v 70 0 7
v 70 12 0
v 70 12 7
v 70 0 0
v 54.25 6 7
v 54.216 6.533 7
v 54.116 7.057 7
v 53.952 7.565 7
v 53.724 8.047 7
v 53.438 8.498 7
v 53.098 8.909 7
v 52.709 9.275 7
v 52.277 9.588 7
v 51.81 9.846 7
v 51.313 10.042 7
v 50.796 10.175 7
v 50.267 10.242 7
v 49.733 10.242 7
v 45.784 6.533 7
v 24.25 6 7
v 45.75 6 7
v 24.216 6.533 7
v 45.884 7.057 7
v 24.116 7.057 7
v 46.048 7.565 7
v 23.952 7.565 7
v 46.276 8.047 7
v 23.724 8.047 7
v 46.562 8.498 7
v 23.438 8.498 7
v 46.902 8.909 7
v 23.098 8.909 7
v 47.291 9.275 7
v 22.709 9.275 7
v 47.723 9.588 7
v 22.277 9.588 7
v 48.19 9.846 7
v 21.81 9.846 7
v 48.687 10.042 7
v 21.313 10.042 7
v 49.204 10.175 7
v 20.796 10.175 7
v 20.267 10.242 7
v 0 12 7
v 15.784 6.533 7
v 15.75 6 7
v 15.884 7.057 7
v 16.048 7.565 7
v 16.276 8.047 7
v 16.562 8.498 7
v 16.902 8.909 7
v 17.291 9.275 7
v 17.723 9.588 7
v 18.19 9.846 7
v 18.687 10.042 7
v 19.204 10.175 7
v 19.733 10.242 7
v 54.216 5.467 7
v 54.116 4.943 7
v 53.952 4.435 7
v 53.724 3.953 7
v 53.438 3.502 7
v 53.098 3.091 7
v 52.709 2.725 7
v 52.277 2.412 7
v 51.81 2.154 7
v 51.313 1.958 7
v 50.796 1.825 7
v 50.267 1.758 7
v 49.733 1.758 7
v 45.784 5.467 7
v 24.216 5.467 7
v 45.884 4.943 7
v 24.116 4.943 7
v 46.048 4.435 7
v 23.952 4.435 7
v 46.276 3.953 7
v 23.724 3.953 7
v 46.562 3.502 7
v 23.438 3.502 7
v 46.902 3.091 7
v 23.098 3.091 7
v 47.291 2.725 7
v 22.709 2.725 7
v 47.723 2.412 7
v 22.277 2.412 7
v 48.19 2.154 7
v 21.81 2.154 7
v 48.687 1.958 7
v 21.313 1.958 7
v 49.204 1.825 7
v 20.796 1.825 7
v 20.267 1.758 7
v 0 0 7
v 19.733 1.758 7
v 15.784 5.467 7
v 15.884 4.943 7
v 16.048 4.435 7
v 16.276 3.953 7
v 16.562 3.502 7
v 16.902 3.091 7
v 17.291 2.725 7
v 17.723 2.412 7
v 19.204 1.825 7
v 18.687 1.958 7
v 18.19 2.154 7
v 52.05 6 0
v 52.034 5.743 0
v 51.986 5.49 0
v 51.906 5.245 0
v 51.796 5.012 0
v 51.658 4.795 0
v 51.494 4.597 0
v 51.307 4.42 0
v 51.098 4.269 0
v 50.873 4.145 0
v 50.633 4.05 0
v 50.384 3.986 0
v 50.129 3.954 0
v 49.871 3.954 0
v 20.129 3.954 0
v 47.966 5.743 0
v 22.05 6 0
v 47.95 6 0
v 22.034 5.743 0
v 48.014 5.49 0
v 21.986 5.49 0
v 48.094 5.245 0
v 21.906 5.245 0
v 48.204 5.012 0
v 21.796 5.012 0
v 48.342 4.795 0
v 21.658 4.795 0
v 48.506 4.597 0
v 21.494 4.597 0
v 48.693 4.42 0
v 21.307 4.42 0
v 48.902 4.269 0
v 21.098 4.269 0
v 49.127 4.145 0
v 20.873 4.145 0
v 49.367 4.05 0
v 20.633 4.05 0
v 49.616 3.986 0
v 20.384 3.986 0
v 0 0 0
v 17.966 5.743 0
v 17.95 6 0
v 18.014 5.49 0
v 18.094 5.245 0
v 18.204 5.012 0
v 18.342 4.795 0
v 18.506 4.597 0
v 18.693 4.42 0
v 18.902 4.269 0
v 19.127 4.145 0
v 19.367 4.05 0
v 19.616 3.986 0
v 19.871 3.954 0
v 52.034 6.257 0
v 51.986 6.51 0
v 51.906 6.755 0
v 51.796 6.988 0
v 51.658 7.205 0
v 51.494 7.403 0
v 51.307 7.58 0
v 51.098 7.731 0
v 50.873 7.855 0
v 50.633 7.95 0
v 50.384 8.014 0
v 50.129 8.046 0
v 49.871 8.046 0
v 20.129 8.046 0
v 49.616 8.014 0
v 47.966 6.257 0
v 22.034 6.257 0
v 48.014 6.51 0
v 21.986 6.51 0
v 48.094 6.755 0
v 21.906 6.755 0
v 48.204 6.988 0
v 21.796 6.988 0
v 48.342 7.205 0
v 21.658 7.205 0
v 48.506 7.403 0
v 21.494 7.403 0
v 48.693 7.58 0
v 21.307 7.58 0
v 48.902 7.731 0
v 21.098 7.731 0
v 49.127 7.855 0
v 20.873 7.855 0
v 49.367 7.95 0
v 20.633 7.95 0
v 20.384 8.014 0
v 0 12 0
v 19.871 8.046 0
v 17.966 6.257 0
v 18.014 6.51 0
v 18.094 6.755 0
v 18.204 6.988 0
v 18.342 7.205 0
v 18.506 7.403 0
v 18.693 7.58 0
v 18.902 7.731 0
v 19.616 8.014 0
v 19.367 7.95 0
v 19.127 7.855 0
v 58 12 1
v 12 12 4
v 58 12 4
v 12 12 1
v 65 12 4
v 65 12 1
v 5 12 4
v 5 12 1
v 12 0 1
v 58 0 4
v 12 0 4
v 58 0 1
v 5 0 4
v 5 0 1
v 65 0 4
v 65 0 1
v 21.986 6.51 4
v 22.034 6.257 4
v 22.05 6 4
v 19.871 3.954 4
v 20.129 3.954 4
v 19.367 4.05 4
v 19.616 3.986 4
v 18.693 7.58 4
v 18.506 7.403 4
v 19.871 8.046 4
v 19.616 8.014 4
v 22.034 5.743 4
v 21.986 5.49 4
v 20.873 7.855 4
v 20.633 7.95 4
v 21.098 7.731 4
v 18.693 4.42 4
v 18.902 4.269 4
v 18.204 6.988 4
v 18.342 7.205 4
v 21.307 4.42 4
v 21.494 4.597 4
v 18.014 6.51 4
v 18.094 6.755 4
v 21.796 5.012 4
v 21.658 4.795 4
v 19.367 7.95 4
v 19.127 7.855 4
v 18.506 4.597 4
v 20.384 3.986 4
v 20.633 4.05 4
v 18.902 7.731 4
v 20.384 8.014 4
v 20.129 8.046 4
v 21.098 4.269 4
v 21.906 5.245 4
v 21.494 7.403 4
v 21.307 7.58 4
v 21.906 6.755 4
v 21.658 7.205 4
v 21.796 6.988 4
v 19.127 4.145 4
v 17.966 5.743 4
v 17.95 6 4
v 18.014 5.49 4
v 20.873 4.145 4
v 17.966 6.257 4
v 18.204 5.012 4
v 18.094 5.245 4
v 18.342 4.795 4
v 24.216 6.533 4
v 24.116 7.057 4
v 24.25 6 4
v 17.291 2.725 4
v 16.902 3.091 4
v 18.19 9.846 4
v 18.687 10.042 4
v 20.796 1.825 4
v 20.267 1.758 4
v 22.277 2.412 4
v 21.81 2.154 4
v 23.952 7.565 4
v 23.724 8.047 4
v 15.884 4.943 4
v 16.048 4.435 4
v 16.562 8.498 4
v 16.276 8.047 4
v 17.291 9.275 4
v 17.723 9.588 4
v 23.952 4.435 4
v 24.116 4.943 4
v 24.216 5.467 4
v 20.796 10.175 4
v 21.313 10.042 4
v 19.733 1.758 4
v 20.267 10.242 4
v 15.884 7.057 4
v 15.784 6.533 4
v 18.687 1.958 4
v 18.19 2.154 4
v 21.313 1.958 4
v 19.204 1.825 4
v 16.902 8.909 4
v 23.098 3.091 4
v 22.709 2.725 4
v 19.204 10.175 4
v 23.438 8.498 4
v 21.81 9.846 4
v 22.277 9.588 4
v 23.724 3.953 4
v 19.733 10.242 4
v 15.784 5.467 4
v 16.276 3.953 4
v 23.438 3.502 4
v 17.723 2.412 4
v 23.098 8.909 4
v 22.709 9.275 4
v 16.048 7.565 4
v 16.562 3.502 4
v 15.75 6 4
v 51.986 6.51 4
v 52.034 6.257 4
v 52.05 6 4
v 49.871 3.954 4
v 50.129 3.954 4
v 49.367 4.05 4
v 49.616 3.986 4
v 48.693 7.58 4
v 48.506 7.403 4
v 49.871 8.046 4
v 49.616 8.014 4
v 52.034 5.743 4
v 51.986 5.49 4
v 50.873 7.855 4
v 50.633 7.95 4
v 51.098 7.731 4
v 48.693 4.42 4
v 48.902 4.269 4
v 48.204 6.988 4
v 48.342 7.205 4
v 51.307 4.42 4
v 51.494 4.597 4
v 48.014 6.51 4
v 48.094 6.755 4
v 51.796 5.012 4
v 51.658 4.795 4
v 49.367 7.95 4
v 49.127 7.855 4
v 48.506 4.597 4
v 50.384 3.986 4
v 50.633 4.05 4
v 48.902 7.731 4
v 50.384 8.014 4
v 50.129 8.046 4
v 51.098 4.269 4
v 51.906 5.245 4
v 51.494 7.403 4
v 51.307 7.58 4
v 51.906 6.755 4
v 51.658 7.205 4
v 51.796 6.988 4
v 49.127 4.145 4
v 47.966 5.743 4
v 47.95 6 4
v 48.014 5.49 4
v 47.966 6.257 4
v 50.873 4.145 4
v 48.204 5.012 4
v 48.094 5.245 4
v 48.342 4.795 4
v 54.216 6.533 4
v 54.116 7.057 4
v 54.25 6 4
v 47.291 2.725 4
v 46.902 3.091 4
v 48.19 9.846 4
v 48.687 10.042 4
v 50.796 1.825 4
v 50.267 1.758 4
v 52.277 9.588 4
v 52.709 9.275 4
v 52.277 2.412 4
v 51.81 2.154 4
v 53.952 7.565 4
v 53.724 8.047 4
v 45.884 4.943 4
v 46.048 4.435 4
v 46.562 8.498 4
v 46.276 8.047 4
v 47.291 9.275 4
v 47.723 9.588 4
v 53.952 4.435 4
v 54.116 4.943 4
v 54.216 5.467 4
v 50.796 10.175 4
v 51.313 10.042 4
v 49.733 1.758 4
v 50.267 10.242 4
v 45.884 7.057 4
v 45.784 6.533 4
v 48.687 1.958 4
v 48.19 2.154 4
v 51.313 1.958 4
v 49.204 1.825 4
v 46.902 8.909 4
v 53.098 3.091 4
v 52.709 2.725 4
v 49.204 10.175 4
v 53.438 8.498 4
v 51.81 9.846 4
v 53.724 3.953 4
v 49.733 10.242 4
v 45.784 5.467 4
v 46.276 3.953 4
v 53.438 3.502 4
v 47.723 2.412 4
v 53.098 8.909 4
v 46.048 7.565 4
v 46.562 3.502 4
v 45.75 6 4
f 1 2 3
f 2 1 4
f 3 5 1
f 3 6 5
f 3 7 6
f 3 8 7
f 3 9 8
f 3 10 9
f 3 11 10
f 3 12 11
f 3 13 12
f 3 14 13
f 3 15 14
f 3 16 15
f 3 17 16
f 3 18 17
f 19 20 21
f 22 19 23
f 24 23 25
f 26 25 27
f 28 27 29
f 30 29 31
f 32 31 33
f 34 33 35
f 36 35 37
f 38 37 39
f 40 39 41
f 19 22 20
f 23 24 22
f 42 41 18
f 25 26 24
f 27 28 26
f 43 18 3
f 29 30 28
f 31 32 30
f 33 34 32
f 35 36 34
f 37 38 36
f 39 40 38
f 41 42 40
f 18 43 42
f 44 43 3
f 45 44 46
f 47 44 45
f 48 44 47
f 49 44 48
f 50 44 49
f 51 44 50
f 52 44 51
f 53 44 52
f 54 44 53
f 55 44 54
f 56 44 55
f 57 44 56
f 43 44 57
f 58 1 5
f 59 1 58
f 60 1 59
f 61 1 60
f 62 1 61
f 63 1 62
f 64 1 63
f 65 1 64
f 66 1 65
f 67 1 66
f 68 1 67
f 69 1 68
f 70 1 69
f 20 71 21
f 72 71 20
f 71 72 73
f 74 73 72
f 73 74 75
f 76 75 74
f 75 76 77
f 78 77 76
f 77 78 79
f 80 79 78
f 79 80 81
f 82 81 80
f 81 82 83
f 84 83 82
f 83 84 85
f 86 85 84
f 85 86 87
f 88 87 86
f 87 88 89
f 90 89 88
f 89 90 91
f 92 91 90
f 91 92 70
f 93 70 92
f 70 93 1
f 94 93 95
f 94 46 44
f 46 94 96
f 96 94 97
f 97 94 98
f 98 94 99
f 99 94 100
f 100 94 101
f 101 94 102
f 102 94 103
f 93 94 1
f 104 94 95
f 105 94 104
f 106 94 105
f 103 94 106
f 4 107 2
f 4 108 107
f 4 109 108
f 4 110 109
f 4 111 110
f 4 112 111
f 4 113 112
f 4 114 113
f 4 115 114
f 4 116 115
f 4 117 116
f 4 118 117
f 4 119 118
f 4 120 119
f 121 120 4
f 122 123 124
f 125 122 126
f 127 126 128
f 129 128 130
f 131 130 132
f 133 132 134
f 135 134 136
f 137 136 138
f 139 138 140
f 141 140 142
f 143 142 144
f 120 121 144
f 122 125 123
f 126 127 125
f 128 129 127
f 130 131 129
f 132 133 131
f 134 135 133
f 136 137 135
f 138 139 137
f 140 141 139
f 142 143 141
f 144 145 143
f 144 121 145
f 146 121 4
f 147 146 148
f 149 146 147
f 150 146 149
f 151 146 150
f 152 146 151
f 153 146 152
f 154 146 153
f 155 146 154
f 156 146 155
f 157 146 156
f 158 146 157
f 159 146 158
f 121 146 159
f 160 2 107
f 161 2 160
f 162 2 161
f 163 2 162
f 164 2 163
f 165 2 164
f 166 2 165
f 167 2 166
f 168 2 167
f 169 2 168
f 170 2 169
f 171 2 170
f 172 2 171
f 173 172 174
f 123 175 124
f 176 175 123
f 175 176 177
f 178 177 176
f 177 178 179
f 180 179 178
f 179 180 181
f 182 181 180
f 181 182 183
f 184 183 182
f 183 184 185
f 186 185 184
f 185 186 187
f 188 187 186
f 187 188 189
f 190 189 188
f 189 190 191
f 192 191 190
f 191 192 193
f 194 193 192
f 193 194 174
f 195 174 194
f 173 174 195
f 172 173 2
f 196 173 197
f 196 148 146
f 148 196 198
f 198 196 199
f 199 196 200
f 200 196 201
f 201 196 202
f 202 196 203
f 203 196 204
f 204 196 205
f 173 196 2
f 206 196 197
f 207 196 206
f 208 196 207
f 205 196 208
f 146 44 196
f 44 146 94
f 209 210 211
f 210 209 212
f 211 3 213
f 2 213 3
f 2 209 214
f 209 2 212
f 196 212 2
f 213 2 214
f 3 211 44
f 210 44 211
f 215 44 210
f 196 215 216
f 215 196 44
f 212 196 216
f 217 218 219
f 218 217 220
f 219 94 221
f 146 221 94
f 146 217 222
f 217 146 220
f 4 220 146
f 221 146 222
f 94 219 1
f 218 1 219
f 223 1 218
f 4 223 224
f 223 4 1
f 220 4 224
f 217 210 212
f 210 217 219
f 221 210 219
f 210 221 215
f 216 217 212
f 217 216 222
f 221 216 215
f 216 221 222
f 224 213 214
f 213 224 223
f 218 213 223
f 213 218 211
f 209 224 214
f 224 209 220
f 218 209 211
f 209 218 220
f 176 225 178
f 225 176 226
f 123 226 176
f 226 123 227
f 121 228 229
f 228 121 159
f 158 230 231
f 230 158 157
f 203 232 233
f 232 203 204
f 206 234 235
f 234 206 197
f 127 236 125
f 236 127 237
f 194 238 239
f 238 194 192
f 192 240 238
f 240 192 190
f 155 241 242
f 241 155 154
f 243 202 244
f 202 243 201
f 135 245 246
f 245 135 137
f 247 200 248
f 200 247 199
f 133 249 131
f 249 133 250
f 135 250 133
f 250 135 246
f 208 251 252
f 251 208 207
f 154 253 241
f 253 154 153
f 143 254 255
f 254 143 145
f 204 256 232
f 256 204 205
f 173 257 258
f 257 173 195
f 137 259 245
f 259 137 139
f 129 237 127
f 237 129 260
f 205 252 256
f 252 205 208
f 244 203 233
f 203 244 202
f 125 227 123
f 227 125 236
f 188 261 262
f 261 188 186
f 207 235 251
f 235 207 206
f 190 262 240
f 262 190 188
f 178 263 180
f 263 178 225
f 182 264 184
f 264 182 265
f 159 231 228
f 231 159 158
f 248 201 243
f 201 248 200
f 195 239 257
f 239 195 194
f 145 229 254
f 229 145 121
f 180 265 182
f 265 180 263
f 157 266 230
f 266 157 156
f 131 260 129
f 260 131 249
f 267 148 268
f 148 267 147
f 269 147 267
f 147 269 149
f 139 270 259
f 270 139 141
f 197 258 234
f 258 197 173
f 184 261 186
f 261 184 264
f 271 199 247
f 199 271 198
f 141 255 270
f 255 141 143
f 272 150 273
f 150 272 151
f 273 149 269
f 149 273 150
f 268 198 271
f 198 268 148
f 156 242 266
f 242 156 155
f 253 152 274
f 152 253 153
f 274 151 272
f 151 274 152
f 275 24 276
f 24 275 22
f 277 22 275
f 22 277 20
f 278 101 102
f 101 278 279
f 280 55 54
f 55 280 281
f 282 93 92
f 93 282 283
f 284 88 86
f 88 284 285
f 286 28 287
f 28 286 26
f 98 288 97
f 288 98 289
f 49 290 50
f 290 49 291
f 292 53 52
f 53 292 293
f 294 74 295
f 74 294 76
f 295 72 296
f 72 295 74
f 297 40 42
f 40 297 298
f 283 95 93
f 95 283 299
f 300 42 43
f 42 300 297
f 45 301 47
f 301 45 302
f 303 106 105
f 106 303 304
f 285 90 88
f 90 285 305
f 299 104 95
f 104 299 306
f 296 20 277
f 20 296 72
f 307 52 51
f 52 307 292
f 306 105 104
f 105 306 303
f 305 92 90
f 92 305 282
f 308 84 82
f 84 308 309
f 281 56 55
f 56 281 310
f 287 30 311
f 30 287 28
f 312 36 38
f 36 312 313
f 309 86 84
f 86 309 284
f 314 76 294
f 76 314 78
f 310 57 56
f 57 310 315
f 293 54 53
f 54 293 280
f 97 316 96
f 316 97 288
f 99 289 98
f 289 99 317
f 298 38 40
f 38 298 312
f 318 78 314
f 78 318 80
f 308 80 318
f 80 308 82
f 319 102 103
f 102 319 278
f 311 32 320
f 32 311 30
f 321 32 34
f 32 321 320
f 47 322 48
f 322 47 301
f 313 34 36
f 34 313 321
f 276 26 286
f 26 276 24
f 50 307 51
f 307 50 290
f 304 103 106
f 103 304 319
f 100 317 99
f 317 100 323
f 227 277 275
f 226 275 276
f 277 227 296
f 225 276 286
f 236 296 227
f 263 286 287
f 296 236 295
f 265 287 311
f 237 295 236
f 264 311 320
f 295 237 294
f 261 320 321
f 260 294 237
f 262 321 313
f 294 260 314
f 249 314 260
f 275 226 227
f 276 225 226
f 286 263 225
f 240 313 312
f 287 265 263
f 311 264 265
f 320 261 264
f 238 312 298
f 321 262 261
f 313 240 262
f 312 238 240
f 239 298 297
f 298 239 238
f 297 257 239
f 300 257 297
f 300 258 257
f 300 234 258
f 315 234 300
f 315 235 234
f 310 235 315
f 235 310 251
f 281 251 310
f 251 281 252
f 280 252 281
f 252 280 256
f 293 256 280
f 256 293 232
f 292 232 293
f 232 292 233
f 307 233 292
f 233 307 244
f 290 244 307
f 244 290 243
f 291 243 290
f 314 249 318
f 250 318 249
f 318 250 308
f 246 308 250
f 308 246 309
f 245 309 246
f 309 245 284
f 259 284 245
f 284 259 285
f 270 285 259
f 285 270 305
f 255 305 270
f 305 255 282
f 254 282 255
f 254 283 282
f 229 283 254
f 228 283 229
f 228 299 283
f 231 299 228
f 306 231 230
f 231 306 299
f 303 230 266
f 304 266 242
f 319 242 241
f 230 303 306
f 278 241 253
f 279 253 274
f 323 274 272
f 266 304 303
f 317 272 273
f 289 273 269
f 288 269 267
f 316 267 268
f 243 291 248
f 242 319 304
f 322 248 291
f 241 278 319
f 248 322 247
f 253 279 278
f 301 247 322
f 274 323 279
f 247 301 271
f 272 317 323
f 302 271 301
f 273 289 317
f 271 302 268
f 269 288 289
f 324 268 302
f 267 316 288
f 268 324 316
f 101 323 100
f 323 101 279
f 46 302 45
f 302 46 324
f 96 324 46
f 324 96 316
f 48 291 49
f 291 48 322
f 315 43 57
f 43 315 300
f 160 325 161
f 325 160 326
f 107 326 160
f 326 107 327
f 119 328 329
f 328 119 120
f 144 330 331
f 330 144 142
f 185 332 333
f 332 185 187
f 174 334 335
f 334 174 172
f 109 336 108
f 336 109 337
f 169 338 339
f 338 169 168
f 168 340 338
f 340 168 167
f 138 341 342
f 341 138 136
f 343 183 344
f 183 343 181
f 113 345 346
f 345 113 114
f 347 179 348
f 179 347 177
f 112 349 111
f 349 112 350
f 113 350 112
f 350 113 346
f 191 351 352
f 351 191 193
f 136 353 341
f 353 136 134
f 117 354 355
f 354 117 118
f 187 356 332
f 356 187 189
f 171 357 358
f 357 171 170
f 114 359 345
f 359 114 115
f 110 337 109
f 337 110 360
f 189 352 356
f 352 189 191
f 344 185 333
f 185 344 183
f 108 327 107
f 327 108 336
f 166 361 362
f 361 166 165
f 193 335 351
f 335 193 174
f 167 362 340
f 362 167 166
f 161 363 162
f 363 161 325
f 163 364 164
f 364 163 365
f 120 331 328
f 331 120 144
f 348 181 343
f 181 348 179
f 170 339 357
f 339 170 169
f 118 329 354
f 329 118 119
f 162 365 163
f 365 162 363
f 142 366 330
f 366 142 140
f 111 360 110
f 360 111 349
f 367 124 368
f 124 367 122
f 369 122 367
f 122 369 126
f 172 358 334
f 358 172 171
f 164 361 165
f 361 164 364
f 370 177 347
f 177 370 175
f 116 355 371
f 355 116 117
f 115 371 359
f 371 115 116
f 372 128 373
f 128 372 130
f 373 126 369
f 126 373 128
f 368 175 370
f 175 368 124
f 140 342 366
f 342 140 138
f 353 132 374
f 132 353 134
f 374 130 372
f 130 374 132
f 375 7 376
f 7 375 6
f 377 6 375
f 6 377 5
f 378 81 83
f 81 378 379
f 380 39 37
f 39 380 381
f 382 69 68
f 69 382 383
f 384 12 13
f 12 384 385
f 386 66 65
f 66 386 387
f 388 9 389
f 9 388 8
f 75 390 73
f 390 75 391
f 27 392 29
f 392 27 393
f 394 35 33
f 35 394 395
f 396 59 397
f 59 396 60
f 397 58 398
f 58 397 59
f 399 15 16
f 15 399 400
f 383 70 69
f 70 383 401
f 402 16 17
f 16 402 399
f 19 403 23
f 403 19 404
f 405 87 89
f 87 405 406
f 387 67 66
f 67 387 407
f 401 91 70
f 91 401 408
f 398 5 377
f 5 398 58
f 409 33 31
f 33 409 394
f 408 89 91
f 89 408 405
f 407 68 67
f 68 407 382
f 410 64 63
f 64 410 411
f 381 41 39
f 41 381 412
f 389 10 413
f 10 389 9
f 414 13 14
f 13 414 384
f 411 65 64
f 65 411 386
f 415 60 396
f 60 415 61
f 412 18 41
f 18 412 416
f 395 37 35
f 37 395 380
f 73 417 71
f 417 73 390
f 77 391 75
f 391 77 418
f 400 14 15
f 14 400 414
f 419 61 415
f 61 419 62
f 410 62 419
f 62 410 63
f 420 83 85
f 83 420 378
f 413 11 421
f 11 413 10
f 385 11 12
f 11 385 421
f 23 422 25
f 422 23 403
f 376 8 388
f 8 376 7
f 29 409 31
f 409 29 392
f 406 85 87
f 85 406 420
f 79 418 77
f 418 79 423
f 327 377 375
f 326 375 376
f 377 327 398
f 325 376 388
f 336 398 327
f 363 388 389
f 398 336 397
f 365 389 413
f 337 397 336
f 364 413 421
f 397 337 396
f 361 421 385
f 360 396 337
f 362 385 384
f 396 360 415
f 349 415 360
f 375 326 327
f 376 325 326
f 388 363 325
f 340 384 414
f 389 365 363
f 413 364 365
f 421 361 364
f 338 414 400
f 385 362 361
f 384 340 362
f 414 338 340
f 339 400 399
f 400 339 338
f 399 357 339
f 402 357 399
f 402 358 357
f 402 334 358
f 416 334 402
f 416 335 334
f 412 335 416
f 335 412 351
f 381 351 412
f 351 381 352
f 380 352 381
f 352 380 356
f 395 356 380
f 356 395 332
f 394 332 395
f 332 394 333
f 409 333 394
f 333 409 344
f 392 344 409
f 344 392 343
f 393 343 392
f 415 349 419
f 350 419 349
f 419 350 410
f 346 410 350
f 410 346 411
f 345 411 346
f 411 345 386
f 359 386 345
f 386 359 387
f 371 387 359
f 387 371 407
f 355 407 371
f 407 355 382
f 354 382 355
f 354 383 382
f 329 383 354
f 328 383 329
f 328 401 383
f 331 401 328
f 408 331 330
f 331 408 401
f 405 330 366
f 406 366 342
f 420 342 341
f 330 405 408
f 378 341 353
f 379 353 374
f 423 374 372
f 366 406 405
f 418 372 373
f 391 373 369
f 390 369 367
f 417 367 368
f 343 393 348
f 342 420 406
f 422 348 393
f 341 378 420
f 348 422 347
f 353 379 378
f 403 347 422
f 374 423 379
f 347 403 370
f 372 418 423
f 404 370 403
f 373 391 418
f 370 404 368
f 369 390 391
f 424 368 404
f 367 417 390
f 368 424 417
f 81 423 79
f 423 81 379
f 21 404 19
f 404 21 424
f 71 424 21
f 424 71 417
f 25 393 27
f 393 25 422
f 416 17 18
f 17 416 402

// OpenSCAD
w = 70;
l = 12;
h = 7;
strap_h = 3;
strap_w = 7;
strap_inset = 1;

screw_d = 30;
screw_head = 8.5;

//head_d = 9;
//body_d = 5;
hole_dist = 5;
//hole_inset = 4;

difference(){
    cube( [ w, l, h ] );
    
    translate( [ hole_dist, -1, strap_inset ] )
        cube( [ strap_w, l + 2, strap_h ] );    
    
    translate( [ w - hole_dist - strap_w, -1, strap_inset ] )
        cube( [ strap_w, l + 2, strap_h ] );        
    translate( [ w / 2 - screw_d / 2, l / 2, -1 ] )
        cylinder( d = 4.1, h = h + 2, $fn = 50 );
    translate( [ w / 2 - screw_d / 2, l / 2, h - 3 ] )
        cylinder( d = screw_head, h = h + 2, $fn = 50 );
    translate( [ w / 2 + screw_d / 2, l / 2, -1 ] )
        cylinder( d = 4.1, h = h + 2, $fn = 50 );
    translate( [ w / 2 + screw_d / 2, l / 2, h - 3 ] )
        cylinder( d = screw_head, h = h + 2, $fn = 50 );
}
